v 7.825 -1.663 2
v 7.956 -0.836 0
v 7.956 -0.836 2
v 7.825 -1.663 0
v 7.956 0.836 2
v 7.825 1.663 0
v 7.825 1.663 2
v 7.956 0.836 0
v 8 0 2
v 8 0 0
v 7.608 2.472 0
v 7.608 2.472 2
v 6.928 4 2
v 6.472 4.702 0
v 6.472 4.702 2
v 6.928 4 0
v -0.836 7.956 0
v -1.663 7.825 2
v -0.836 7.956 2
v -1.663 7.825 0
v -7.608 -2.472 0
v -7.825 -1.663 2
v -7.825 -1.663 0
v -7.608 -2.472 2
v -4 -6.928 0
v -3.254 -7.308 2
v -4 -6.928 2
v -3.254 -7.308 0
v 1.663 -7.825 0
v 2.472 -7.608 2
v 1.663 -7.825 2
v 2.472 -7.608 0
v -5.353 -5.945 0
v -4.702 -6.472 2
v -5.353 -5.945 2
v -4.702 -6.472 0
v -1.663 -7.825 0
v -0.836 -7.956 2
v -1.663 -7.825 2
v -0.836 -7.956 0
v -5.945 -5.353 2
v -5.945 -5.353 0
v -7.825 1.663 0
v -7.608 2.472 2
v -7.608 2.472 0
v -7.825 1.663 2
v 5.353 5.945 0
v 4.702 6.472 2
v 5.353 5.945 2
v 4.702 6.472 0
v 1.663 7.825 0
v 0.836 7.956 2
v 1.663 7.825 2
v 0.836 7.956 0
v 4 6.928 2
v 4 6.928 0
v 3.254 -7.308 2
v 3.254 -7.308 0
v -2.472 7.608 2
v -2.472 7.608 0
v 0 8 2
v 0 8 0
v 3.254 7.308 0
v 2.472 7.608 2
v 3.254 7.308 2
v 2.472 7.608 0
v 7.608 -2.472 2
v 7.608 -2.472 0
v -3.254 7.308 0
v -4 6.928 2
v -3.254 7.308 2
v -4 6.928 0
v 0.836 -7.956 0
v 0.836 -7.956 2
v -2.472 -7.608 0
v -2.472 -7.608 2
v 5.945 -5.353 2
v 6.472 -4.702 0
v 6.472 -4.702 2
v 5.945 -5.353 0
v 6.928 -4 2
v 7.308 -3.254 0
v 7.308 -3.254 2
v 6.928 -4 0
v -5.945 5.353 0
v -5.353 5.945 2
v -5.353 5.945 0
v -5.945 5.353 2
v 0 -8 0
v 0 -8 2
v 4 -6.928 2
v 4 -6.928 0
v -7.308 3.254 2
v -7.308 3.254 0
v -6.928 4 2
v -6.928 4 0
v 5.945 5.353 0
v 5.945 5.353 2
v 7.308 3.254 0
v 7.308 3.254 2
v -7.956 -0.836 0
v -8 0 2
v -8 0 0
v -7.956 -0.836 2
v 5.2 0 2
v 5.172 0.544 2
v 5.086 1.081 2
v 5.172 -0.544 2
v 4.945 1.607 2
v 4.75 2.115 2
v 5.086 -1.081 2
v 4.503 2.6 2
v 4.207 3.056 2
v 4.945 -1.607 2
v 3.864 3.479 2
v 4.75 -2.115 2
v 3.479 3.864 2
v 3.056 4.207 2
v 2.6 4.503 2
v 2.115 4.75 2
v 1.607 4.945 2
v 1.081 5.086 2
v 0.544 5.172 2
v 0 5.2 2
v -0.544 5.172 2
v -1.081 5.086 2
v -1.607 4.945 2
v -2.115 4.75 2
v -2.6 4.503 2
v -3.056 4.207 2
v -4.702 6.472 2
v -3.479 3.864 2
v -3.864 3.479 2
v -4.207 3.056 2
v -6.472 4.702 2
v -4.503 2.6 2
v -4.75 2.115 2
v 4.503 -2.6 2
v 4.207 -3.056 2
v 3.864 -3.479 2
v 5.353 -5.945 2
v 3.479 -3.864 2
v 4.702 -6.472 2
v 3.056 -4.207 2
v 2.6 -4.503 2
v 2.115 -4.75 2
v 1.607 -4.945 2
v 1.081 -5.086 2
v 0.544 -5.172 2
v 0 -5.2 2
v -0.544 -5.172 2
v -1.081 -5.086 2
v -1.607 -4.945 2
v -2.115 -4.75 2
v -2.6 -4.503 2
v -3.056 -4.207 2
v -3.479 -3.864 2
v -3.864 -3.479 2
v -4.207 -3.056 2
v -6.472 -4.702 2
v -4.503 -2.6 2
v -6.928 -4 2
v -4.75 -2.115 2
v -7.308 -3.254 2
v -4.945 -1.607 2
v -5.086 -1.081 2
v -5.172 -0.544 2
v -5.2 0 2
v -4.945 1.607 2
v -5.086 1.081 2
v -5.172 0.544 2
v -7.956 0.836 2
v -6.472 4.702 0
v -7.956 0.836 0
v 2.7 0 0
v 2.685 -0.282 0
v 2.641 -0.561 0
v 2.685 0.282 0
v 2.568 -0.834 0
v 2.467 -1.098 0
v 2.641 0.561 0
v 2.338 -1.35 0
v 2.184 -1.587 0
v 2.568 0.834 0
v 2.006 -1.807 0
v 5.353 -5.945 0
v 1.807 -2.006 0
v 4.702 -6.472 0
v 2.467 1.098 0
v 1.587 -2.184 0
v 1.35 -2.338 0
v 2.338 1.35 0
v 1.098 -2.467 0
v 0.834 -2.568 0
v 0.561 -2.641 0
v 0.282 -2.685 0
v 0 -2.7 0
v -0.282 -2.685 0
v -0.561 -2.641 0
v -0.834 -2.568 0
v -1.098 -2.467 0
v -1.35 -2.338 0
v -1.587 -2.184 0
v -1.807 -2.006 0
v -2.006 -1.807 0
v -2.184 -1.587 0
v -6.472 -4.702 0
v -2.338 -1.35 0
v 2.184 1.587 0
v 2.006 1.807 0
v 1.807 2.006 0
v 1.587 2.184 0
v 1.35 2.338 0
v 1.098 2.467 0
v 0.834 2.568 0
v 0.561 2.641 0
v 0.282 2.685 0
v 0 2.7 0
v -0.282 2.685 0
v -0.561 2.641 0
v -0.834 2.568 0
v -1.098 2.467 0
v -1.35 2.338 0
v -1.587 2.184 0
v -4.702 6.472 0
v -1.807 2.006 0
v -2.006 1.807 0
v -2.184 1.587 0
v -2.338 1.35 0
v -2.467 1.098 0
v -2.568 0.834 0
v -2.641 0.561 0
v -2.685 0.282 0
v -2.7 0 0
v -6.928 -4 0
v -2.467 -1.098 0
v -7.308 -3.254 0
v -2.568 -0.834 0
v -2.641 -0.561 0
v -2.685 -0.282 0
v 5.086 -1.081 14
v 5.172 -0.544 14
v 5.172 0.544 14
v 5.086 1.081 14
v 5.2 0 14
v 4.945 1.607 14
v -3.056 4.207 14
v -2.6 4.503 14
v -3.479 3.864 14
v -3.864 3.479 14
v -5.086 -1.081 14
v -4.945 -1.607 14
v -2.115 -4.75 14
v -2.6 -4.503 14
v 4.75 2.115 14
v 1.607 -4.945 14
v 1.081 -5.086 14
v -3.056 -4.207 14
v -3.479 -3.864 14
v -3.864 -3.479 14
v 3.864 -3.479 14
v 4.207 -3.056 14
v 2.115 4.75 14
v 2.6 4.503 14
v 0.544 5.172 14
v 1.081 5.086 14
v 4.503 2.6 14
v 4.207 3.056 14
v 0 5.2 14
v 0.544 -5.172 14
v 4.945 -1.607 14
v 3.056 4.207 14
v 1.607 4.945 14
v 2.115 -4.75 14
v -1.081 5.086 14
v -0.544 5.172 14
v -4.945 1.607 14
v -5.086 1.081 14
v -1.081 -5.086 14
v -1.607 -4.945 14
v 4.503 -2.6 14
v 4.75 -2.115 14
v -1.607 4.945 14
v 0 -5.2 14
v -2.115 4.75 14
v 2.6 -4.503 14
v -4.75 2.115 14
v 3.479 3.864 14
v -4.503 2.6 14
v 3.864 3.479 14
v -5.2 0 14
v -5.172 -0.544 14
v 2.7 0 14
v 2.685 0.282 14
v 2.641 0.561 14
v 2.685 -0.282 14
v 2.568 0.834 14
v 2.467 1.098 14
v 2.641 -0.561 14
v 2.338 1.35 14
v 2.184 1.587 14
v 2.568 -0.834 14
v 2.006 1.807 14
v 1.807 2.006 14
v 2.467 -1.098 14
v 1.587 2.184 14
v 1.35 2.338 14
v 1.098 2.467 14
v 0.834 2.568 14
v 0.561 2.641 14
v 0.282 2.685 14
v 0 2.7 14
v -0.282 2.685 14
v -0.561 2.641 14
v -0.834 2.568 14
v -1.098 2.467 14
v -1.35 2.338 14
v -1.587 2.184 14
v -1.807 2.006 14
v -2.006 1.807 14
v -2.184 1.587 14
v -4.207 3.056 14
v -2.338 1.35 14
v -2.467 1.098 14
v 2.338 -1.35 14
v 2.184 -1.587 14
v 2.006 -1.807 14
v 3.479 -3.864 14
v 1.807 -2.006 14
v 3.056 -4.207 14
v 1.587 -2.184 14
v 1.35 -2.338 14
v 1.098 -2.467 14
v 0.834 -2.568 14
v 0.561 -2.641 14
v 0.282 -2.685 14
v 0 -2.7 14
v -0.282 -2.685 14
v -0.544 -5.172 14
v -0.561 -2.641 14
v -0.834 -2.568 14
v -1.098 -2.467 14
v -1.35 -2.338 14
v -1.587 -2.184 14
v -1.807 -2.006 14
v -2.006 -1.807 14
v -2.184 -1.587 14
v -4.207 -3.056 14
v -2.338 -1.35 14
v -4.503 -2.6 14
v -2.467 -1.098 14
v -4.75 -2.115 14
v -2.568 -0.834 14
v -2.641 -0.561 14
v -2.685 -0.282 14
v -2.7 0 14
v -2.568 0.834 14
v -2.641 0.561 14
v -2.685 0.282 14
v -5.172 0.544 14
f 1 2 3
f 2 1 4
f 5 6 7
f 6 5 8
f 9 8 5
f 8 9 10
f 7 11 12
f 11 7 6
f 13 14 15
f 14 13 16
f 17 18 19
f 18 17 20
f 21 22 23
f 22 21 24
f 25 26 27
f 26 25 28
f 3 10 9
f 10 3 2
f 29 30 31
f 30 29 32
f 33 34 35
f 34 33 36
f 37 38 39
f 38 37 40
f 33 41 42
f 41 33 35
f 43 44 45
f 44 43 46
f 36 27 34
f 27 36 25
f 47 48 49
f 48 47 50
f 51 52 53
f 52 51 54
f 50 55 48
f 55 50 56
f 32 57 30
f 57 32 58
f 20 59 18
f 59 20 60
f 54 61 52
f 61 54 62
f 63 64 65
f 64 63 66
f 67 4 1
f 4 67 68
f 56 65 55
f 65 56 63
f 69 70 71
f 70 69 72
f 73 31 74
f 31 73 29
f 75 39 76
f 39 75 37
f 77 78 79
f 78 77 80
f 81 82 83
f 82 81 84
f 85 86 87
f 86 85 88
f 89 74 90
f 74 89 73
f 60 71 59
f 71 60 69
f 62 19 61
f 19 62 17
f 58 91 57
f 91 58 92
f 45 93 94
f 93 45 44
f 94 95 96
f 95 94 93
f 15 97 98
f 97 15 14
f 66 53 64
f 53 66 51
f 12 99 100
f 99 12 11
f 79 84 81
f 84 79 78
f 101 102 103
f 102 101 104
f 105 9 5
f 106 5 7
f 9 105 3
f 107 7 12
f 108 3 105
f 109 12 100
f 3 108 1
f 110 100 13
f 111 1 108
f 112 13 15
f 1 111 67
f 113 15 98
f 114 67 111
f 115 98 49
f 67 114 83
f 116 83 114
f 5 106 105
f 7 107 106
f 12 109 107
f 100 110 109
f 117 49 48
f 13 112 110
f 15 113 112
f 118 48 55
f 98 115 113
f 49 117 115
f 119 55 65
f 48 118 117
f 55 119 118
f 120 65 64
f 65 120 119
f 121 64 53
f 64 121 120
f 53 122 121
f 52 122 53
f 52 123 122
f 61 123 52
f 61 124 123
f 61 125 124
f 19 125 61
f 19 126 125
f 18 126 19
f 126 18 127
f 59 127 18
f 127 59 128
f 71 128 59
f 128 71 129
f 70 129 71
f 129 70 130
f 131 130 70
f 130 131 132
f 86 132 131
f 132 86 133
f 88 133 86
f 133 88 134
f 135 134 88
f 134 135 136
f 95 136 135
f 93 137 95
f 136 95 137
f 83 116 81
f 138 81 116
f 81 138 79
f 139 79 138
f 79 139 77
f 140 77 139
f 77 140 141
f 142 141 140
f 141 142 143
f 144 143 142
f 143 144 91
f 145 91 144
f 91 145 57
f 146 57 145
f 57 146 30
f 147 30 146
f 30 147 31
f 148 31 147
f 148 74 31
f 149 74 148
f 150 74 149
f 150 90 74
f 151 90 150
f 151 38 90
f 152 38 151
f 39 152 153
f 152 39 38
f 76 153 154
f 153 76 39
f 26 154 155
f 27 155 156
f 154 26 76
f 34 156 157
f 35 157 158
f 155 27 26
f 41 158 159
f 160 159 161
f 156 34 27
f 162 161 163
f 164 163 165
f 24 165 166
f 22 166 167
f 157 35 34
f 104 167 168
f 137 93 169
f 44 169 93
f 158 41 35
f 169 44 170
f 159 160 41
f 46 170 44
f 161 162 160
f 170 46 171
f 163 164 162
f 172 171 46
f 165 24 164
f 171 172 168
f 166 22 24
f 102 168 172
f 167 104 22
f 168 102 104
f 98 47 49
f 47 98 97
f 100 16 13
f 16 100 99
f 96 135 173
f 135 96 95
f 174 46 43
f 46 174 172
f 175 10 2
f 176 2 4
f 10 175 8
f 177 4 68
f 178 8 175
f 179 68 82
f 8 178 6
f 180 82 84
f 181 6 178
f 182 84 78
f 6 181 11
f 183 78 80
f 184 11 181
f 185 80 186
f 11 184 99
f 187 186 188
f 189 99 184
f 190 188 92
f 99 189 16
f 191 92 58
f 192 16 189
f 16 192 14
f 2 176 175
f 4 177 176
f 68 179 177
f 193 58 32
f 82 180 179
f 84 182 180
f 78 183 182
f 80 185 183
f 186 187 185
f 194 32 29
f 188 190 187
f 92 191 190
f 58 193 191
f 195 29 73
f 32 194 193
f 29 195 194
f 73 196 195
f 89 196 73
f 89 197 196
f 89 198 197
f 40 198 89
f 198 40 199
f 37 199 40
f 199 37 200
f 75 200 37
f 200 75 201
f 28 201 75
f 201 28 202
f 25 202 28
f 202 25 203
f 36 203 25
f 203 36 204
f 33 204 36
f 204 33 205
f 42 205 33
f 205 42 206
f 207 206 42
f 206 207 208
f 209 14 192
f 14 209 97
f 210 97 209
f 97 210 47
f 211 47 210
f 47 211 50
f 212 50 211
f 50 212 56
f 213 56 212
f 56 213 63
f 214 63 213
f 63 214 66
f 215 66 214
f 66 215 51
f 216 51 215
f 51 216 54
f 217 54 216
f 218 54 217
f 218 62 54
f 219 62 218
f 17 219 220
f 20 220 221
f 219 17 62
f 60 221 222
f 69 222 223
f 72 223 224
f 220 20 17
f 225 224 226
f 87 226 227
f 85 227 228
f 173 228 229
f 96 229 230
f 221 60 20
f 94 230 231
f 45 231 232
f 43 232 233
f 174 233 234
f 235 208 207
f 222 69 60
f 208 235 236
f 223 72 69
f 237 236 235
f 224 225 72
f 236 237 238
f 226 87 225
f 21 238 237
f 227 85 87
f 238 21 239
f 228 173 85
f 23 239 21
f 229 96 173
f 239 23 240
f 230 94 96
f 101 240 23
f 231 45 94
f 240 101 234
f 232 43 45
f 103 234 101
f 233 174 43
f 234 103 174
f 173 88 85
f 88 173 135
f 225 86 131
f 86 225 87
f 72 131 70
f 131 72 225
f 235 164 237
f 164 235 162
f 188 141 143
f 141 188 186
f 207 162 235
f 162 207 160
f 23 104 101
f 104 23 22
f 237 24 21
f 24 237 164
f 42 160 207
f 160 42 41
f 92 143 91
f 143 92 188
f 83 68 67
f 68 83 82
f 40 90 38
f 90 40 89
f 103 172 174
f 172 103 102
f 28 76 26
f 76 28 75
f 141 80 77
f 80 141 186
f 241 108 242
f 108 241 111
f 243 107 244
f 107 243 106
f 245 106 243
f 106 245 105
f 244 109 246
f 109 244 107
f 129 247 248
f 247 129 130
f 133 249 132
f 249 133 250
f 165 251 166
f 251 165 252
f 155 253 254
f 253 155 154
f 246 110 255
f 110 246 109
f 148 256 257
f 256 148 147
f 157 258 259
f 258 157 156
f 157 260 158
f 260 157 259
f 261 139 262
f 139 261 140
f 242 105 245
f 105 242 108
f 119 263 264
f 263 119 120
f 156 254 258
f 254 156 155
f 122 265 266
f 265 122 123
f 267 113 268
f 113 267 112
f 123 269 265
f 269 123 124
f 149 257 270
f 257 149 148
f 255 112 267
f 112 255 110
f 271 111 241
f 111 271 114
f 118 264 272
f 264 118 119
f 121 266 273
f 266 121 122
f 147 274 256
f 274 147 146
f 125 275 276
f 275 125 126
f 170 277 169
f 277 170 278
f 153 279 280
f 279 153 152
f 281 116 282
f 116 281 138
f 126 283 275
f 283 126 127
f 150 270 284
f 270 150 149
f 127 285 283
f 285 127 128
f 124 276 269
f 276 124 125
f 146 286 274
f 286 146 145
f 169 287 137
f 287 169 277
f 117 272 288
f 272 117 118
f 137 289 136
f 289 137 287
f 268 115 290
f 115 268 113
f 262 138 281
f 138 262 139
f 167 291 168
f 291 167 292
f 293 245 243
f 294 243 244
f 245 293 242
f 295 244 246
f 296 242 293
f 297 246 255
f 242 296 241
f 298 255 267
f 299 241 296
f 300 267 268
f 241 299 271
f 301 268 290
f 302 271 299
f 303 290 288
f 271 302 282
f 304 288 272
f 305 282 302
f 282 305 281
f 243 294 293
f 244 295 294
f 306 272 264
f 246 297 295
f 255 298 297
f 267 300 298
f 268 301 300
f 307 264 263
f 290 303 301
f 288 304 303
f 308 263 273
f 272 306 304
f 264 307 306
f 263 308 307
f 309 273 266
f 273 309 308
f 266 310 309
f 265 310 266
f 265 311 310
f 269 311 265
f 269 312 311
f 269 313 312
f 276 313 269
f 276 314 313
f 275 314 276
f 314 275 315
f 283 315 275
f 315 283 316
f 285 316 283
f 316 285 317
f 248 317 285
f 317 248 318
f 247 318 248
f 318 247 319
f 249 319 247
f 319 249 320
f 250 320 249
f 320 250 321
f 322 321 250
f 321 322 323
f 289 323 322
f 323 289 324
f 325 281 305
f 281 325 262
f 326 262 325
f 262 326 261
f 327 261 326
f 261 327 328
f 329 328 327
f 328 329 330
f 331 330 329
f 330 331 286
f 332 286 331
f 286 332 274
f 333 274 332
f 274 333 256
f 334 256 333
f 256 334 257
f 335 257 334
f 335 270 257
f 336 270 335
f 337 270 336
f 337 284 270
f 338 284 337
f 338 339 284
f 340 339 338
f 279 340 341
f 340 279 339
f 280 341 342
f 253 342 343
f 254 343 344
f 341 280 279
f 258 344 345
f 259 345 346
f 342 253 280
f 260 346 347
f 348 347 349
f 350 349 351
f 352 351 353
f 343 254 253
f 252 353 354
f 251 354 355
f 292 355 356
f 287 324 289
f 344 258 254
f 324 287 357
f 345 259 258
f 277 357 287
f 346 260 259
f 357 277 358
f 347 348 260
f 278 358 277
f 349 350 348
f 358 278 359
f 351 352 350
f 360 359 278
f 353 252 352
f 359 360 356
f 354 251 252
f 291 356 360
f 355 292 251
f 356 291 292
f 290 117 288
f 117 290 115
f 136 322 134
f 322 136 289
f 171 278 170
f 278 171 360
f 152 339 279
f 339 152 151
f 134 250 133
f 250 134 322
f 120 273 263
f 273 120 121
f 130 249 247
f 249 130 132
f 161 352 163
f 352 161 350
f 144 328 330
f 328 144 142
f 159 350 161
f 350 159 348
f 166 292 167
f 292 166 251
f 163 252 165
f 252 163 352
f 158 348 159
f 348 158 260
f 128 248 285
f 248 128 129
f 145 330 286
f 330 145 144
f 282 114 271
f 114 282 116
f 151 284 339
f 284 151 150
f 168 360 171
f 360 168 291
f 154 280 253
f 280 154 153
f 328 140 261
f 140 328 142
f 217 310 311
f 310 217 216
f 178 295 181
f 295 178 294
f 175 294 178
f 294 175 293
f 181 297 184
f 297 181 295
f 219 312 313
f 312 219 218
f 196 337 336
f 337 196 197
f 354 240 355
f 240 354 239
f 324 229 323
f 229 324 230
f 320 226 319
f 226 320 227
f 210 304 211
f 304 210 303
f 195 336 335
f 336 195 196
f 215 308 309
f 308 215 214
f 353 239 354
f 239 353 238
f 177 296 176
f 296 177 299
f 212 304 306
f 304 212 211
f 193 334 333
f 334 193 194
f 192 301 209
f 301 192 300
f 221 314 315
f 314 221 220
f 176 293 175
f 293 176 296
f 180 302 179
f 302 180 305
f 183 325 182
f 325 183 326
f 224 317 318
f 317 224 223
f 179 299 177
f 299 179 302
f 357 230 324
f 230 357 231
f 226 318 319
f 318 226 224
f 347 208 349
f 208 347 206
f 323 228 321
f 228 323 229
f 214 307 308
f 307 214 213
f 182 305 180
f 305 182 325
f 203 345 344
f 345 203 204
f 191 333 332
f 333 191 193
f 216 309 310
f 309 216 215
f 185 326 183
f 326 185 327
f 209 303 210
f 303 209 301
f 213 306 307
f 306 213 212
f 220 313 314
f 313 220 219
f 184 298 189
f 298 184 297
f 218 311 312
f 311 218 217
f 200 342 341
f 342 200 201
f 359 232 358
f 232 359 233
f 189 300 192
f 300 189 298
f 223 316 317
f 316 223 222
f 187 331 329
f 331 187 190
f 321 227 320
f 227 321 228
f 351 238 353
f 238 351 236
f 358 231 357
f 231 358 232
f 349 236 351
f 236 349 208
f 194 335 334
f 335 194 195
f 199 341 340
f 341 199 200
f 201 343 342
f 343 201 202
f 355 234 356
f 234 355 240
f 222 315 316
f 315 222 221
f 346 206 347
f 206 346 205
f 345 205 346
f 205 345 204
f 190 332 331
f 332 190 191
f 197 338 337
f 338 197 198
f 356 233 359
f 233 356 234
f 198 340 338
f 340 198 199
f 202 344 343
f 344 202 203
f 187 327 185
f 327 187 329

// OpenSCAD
// Wall-mount standoff with screw flange.
$fn = 60;
eps = 0.02;
thread_d = 5.4;
base_d = 16;
length = 14;
difference() { union() { cylinder(d=base_d,h=2); cylinder(d=thread_d+5,h=length); } translate([0,0,-eps]) cylinder(d=thread_d,h=length+2*eps); }
